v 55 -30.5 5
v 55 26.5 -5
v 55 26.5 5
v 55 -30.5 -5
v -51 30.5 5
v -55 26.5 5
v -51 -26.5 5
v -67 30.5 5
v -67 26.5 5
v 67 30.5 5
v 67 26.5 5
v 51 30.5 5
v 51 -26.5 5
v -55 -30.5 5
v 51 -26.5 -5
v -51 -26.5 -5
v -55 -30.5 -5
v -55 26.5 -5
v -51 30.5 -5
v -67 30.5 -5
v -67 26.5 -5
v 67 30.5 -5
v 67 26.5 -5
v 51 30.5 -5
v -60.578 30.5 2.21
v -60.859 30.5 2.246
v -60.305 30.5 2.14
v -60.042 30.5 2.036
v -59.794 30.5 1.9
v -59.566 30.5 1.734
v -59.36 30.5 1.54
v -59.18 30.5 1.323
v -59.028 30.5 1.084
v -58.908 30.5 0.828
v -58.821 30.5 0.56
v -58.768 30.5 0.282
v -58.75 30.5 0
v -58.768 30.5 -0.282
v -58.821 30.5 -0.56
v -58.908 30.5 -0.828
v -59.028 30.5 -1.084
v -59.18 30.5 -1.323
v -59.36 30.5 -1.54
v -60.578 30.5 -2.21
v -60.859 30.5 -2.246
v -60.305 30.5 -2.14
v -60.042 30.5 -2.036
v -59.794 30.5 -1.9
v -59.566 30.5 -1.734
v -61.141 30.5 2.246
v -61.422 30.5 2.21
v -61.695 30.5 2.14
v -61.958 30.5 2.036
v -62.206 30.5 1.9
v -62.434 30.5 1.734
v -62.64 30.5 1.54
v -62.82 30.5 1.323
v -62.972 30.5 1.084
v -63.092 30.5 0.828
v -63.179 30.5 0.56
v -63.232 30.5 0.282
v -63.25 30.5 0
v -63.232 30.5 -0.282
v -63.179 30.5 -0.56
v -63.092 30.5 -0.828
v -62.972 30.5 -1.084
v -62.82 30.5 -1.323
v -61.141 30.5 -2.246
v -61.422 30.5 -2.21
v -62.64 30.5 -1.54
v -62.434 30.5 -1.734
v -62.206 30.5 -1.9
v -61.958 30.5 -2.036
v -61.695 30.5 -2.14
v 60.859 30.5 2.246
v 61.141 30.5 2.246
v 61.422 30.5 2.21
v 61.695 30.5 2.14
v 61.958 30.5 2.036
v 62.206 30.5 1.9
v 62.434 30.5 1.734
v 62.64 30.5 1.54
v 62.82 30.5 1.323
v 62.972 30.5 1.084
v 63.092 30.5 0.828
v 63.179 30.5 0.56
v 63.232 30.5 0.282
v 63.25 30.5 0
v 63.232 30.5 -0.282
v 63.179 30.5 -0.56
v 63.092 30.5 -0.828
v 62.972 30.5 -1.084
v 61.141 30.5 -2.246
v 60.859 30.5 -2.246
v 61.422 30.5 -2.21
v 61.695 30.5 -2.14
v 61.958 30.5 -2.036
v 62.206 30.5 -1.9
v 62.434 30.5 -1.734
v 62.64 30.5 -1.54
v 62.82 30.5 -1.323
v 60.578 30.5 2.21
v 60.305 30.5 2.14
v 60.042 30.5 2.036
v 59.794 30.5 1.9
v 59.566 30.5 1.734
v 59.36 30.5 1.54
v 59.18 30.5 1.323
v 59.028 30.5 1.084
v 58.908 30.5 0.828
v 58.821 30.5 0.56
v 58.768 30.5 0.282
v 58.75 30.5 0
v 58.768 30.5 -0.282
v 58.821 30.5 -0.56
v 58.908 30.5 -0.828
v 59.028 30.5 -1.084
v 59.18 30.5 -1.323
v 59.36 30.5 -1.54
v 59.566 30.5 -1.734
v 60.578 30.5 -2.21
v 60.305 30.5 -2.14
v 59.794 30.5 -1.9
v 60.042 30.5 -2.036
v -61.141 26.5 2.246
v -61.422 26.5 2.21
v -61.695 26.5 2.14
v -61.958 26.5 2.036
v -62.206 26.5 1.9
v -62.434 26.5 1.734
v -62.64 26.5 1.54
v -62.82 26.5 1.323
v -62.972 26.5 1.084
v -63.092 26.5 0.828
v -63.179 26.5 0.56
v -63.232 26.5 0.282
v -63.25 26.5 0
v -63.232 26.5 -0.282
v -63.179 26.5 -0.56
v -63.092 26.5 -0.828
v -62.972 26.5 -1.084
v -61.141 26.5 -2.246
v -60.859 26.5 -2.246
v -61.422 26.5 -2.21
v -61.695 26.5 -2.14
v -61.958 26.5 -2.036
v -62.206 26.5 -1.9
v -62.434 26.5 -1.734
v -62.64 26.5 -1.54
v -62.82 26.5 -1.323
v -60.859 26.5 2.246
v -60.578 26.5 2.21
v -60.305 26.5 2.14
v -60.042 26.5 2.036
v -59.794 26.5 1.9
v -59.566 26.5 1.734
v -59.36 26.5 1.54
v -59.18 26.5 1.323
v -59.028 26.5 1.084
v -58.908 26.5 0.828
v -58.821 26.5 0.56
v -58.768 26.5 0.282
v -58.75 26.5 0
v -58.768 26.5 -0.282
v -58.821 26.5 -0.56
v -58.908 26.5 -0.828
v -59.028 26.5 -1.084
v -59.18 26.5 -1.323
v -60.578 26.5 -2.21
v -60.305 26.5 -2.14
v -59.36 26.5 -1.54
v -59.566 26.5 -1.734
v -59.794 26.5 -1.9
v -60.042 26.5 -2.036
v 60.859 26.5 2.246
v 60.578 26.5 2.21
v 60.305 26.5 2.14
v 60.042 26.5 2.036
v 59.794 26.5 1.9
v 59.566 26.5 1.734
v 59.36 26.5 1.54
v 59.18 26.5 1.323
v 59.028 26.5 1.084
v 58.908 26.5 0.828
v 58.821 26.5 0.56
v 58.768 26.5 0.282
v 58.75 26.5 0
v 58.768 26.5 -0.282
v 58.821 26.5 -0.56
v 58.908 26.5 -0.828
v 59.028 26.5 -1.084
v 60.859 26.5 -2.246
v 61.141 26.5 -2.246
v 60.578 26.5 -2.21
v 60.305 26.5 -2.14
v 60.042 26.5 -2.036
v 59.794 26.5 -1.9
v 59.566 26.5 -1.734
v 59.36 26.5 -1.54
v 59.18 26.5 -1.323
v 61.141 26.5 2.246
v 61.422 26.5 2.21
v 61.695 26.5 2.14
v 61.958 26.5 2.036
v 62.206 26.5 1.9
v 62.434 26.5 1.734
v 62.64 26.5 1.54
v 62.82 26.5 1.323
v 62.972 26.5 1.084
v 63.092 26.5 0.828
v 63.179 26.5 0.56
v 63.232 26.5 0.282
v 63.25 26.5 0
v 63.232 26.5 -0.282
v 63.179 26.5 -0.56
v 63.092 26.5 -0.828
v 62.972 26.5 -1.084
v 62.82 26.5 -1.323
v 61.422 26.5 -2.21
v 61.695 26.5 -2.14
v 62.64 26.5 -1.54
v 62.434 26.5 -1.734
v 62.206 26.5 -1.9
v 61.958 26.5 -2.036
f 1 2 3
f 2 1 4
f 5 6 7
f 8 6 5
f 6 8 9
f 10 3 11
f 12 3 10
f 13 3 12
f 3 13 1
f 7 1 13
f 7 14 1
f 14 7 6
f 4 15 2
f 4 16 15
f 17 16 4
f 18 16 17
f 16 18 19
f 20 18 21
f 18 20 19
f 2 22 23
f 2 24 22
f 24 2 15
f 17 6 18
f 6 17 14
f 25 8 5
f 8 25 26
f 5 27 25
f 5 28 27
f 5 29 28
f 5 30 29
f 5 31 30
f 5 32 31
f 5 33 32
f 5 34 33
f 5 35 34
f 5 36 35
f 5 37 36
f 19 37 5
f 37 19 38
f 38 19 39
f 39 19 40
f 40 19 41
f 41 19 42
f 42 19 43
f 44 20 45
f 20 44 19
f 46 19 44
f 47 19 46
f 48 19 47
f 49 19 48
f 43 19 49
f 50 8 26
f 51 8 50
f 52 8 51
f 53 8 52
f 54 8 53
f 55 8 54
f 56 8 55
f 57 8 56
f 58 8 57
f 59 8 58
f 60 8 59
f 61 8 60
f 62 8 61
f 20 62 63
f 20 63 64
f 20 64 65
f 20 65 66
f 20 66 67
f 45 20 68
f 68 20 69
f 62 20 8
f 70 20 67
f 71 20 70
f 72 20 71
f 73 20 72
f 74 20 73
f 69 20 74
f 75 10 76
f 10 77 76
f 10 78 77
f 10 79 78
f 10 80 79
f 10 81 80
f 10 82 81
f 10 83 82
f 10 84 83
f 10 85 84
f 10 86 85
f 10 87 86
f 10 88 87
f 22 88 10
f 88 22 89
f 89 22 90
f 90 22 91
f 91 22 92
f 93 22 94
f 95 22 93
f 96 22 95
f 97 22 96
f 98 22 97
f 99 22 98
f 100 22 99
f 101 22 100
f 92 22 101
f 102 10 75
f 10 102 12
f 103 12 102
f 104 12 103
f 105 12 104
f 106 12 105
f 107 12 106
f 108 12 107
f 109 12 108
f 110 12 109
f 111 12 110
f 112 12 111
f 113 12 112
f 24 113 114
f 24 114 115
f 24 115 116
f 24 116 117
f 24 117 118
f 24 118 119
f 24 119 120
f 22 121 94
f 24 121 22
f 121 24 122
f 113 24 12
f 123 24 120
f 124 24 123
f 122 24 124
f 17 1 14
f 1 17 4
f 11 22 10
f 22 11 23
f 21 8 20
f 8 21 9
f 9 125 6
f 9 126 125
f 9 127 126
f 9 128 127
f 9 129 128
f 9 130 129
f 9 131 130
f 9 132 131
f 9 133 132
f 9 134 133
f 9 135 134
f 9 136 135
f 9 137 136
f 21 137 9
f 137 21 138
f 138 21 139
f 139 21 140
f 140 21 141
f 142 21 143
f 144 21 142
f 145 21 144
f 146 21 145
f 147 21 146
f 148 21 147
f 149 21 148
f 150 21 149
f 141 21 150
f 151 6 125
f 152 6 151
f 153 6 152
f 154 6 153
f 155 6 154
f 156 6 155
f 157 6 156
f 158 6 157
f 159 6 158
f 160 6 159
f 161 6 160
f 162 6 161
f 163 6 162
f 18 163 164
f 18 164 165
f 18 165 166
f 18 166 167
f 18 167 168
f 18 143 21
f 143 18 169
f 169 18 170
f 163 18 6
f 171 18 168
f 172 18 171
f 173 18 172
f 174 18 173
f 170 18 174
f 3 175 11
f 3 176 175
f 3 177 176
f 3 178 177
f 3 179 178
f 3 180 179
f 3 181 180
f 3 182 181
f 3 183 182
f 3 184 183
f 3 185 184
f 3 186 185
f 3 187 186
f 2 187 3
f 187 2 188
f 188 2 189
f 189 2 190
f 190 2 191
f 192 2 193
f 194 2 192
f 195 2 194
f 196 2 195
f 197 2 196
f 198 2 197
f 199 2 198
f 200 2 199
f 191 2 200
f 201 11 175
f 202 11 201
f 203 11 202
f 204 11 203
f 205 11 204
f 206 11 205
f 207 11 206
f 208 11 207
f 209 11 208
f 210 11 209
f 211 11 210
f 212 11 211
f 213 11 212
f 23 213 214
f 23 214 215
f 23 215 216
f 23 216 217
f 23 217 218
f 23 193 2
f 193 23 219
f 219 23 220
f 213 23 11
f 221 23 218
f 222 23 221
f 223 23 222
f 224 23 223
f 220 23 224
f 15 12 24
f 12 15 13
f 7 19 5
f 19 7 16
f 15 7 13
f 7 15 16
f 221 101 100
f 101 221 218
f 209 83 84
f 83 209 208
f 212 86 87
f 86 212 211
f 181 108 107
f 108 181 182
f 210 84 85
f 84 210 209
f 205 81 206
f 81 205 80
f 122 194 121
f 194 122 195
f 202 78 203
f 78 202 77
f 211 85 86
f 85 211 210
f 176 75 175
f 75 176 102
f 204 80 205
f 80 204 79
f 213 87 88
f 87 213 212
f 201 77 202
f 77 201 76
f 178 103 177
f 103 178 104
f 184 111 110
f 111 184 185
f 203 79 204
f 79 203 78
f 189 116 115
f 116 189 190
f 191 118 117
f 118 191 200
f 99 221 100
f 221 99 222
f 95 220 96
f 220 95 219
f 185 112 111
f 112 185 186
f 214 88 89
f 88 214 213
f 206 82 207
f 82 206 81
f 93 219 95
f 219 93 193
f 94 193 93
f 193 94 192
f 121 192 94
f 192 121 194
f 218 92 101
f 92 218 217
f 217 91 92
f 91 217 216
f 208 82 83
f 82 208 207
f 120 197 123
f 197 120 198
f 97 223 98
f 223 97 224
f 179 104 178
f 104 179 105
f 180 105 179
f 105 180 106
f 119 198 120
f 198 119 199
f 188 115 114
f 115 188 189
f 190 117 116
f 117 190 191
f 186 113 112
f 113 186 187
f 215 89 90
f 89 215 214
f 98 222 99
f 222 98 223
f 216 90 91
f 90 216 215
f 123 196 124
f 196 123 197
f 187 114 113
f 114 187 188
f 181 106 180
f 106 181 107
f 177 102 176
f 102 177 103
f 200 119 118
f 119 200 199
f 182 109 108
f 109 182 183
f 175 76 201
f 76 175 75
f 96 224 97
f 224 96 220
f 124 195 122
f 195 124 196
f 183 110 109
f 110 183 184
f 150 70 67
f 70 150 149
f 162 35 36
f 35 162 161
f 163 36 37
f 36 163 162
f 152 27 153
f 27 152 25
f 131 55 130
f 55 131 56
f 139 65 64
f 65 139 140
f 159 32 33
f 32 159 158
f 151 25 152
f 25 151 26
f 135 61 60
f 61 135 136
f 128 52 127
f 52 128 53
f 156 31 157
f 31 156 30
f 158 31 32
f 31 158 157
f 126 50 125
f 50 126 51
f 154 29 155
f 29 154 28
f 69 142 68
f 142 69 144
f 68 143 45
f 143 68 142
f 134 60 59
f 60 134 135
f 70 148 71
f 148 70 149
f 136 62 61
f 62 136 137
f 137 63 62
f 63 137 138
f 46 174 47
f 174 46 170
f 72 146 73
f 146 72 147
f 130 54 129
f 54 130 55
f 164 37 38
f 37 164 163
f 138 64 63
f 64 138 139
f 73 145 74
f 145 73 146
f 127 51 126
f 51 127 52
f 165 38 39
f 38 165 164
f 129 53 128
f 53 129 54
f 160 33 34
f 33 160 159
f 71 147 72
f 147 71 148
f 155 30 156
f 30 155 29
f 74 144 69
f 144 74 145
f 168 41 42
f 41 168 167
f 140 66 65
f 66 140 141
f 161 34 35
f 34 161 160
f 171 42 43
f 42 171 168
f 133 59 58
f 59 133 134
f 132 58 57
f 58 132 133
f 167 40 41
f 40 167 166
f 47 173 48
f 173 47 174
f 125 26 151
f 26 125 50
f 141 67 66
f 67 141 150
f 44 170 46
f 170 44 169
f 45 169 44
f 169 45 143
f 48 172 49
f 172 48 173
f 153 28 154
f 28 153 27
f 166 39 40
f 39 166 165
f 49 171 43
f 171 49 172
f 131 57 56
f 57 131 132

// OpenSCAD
// height of power supply
psuHeight = 102;

// depth of power supply
psuDepth = 53;

// diameter of mounting holes
mountHoleDia = 4.5;

// length of mount pad
mountPadLength = 12;

// wall thickness
thickness = 4;

// width of bracket
width = 10;



module bracket() {
  difference() {
    union() {
        cube([psuHeight+2*thickness, psuDepth+2*thickness, width], center=true);
        translate([0,psuDepth/2+thickness/2,0]) cube([psuHeight+2*thickness+2*mountPadLength, thickness, width], center=true);
    }
    translate([0,thickness,0]) cube([psuHeight,psuDepth+thickness*2,width+0.01], center=true);
  
  
    translate([psuHeight/2+thickness+mountPadLength/2,0,0]) 
    rotate([90,0,0]) cylinder (d=mountHoleDia, h=psuDepth*2, center=true, $fn=50);
  
    translate([-psuHeight/2-thickness-mountPadLength/2,0,0]) 
    rotate([90,0,0]) cylinder (d=mountHoleDia, h=psuDepth*2, center=true, $fn=50);
  }
}

bracket();
